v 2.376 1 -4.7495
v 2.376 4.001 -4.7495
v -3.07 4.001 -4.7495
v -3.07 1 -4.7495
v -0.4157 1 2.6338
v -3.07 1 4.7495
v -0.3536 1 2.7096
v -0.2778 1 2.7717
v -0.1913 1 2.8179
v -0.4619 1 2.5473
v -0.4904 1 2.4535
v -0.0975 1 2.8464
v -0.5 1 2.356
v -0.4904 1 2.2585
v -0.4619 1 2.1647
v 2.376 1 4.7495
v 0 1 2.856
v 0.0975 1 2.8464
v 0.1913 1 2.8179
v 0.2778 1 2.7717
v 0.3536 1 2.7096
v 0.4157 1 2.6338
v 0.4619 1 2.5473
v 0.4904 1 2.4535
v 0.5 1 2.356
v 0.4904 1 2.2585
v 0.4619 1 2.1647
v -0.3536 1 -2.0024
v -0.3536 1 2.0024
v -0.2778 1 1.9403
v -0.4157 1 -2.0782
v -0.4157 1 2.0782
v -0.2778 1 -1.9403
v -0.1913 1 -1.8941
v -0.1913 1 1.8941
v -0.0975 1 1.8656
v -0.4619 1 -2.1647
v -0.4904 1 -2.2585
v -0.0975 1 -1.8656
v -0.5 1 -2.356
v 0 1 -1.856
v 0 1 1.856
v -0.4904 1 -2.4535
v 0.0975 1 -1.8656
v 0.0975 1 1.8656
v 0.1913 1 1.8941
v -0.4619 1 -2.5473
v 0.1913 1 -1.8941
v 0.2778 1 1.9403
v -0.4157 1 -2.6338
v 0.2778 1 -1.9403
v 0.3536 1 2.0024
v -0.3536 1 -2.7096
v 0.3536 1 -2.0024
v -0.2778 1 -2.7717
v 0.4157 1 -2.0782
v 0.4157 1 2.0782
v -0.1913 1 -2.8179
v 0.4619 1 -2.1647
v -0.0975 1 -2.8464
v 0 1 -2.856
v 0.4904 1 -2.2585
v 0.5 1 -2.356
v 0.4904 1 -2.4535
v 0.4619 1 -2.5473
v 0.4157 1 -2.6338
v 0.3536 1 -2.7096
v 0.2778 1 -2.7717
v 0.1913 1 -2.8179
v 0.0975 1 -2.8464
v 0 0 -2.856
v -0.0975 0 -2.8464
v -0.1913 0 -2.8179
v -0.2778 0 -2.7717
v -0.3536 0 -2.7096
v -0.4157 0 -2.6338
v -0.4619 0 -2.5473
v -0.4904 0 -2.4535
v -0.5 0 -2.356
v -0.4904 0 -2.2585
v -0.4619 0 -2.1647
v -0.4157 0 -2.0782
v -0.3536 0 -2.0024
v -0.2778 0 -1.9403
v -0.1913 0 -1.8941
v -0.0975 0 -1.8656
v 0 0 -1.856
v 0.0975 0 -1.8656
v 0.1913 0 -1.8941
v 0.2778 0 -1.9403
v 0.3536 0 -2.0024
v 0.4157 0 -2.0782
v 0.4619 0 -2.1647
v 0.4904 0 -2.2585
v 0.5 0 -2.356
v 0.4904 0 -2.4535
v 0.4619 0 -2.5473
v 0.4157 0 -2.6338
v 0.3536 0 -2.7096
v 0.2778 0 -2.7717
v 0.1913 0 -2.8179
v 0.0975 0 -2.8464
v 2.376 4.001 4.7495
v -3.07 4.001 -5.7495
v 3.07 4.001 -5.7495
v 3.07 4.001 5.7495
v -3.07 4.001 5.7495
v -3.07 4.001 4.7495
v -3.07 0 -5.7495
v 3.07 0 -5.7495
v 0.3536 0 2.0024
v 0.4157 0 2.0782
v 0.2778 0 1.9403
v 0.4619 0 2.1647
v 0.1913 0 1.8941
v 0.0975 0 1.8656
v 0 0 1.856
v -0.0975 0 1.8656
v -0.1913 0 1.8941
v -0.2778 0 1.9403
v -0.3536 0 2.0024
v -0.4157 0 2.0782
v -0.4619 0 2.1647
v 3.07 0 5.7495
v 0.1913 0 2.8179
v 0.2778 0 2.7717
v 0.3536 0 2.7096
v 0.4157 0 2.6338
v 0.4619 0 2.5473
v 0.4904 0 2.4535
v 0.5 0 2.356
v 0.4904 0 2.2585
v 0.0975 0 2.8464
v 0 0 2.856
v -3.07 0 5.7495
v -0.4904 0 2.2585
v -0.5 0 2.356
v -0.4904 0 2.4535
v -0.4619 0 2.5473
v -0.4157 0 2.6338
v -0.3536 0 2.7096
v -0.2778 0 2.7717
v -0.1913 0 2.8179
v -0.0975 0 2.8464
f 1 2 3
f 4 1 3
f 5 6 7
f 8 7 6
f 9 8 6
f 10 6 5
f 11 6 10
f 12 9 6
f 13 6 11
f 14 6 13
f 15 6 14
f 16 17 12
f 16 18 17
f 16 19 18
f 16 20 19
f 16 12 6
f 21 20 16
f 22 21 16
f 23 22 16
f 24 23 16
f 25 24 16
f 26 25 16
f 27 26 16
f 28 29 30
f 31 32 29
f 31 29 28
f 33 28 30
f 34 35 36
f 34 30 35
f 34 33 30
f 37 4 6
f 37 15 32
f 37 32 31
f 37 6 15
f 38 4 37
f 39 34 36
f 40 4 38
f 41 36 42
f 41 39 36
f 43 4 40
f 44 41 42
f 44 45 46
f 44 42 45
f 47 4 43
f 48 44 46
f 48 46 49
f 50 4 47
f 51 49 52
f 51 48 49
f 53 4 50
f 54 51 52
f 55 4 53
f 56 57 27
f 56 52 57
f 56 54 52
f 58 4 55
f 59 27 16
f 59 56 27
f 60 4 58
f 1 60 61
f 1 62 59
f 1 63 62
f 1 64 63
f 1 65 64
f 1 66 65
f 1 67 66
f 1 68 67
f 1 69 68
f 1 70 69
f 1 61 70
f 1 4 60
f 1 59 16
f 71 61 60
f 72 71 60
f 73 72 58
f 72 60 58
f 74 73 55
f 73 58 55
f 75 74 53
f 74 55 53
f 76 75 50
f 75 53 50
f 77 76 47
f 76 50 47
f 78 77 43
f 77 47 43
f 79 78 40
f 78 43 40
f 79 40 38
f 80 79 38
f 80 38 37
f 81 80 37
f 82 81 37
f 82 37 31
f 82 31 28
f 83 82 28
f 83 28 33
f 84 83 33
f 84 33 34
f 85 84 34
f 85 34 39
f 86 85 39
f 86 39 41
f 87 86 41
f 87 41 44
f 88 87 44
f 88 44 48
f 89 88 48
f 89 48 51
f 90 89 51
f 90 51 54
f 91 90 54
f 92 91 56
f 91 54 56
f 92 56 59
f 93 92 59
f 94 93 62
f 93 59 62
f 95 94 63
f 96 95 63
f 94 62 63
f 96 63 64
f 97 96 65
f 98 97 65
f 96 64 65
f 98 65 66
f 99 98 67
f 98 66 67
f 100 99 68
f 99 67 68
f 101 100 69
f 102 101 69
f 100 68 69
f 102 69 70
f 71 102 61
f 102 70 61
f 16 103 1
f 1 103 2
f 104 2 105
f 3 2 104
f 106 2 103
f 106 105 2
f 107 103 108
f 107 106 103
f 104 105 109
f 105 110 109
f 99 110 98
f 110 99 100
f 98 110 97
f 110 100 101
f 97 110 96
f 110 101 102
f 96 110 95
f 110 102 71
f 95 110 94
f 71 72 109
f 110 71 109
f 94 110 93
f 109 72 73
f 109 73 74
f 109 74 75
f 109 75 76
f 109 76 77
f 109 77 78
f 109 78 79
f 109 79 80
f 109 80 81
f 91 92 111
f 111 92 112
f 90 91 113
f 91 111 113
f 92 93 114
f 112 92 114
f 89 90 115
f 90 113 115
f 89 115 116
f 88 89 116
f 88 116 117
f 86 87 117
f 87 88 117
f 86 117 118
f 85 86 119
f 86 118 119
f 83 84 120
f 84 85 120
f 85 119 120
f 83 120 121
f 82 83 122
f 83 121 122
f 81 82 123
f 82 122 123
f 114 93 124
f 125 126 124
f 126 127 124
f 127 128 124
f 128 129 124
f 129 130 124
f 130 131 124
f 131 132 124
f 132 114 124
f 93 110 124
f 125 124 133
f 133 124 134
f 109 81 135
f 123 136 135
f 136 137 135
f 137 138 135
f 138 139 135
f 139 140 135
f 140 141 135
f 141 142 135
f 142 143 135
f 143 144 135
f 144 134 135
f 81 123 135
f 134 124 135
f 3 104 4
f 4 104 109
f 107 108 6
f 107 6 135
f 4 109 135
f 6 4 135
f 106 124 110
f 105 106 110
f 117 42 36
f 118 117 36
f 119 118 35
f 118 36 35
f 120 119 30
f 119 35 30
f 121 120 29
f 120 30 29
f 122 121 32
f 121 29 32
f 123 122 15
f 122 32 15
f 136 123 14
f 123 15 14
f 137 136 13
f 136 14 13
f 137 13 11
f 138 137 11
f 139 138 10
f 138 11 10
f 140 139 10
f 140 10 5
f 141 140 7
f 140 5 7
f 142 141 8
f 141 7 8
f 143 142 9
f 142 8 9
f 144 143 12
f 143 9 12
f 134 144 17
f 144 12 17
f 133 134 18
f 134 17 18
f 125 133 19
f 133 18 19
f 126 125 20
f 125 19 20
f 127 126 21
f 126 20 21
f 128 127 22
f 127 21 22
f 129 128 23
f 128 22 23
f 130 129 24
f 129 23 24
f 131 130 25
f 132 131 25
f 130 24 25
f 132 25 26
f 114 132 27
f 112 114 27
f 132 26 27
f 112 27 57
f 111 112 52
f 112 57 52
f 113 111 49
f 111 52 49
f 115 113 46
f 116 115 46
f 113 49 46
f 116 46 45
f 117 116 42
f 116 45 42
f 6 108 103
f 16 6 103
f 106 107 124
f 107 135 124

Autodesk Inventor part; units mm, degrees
ref_plane "YZ Plane" through (0, 0, 0) normal (1, 0, 0) x (0, 1, 0)
ref_plane "XZ Plane" through (0, 0, 0) normal (0, 1, 0) x (-1, 0, 0)
ref_plane "XY Plane" through (0, 0, 0) normal (0, 0, 1) x (1, 0, 0)
sketch "Sketch1" plane through (0, 0, 0) normal (0, 1, 0) x (-1, 0, 0)
  line L0 (3.07, 5.7495) -> (-3.07, 5.7495)
  line L1 (-3.07, 5.7495) -> (-3.07, -5.7495)
  line L2 (-3.07, -5.7495) -> (3.07, -5.7495)
  line L3 (3.07, -5.7495) -> (3.07, 5.7495)
  line L4 (3.07, 0) -> (-3.07, 0) construction
  line L5 (0, 5.7495) -> (0, -5.7495) construction
  point P0 (0, 0)
  point P1 (0, 0)
  point P2 (0, 0)
  point P3 (0, 0)
  dimension "d0" = 6.14
  dimension "d1" = 11.499
extrude "Extrusion1" add sketch "Sketch1" along normal blind 4.001
sketch "Sketch2" plane through (0, 4.001, 0) normal (0, 1, 0) x (1, 0, 0)
  line L0 (-7.624, -4.7495) -> (2.376, -4.7495)
  line L1 (2.376, -4.7495) -> (2.376, 4.7495)
  line L2 (2.376, 4.7495) -> (-7.624, 4.7495)
  line L3 (-7.624, 4.7495) -> (-7.624, -4.7495)
  line L4 (-5, 0) -> (5, 0) construction
  line L5 (0, -4.7495) -> (0, 4.7495) construction
  point P0 (0, 0)
  point P1 (0, 0)
  point P2 (0, 0)
  dimension "d4" = 9.499
  dimension "d5" = 10
extrude "Extrusion2" cut sketch "Sketch2" against normal blind 3.001
sketch "Sketch3" plane through (0, 0, 0) normal (0, -1, 0) x (1, 0, 0)
  circle A0 centre (0, -2.356) radius 0.5
  line L0 (-3.07, 4.7495) -> (-3.07, -4.7495) construction
  line L1 (-3.07, 0) -> (3.07, 0) construction
  line L2 (3.07, 5.7495) -> (3.07, -5.7495) construction
  circle A1 centre (0, 2.356) radius 0.5
  point P0 (0, 0)
  dimension "d8" = 1
hole "Hole1" at (0, 0, -2.356) at (0, 0, 2.356) direction (0, 1, 0) diameter 1 end through all
properties part number "LDR_Shield"
